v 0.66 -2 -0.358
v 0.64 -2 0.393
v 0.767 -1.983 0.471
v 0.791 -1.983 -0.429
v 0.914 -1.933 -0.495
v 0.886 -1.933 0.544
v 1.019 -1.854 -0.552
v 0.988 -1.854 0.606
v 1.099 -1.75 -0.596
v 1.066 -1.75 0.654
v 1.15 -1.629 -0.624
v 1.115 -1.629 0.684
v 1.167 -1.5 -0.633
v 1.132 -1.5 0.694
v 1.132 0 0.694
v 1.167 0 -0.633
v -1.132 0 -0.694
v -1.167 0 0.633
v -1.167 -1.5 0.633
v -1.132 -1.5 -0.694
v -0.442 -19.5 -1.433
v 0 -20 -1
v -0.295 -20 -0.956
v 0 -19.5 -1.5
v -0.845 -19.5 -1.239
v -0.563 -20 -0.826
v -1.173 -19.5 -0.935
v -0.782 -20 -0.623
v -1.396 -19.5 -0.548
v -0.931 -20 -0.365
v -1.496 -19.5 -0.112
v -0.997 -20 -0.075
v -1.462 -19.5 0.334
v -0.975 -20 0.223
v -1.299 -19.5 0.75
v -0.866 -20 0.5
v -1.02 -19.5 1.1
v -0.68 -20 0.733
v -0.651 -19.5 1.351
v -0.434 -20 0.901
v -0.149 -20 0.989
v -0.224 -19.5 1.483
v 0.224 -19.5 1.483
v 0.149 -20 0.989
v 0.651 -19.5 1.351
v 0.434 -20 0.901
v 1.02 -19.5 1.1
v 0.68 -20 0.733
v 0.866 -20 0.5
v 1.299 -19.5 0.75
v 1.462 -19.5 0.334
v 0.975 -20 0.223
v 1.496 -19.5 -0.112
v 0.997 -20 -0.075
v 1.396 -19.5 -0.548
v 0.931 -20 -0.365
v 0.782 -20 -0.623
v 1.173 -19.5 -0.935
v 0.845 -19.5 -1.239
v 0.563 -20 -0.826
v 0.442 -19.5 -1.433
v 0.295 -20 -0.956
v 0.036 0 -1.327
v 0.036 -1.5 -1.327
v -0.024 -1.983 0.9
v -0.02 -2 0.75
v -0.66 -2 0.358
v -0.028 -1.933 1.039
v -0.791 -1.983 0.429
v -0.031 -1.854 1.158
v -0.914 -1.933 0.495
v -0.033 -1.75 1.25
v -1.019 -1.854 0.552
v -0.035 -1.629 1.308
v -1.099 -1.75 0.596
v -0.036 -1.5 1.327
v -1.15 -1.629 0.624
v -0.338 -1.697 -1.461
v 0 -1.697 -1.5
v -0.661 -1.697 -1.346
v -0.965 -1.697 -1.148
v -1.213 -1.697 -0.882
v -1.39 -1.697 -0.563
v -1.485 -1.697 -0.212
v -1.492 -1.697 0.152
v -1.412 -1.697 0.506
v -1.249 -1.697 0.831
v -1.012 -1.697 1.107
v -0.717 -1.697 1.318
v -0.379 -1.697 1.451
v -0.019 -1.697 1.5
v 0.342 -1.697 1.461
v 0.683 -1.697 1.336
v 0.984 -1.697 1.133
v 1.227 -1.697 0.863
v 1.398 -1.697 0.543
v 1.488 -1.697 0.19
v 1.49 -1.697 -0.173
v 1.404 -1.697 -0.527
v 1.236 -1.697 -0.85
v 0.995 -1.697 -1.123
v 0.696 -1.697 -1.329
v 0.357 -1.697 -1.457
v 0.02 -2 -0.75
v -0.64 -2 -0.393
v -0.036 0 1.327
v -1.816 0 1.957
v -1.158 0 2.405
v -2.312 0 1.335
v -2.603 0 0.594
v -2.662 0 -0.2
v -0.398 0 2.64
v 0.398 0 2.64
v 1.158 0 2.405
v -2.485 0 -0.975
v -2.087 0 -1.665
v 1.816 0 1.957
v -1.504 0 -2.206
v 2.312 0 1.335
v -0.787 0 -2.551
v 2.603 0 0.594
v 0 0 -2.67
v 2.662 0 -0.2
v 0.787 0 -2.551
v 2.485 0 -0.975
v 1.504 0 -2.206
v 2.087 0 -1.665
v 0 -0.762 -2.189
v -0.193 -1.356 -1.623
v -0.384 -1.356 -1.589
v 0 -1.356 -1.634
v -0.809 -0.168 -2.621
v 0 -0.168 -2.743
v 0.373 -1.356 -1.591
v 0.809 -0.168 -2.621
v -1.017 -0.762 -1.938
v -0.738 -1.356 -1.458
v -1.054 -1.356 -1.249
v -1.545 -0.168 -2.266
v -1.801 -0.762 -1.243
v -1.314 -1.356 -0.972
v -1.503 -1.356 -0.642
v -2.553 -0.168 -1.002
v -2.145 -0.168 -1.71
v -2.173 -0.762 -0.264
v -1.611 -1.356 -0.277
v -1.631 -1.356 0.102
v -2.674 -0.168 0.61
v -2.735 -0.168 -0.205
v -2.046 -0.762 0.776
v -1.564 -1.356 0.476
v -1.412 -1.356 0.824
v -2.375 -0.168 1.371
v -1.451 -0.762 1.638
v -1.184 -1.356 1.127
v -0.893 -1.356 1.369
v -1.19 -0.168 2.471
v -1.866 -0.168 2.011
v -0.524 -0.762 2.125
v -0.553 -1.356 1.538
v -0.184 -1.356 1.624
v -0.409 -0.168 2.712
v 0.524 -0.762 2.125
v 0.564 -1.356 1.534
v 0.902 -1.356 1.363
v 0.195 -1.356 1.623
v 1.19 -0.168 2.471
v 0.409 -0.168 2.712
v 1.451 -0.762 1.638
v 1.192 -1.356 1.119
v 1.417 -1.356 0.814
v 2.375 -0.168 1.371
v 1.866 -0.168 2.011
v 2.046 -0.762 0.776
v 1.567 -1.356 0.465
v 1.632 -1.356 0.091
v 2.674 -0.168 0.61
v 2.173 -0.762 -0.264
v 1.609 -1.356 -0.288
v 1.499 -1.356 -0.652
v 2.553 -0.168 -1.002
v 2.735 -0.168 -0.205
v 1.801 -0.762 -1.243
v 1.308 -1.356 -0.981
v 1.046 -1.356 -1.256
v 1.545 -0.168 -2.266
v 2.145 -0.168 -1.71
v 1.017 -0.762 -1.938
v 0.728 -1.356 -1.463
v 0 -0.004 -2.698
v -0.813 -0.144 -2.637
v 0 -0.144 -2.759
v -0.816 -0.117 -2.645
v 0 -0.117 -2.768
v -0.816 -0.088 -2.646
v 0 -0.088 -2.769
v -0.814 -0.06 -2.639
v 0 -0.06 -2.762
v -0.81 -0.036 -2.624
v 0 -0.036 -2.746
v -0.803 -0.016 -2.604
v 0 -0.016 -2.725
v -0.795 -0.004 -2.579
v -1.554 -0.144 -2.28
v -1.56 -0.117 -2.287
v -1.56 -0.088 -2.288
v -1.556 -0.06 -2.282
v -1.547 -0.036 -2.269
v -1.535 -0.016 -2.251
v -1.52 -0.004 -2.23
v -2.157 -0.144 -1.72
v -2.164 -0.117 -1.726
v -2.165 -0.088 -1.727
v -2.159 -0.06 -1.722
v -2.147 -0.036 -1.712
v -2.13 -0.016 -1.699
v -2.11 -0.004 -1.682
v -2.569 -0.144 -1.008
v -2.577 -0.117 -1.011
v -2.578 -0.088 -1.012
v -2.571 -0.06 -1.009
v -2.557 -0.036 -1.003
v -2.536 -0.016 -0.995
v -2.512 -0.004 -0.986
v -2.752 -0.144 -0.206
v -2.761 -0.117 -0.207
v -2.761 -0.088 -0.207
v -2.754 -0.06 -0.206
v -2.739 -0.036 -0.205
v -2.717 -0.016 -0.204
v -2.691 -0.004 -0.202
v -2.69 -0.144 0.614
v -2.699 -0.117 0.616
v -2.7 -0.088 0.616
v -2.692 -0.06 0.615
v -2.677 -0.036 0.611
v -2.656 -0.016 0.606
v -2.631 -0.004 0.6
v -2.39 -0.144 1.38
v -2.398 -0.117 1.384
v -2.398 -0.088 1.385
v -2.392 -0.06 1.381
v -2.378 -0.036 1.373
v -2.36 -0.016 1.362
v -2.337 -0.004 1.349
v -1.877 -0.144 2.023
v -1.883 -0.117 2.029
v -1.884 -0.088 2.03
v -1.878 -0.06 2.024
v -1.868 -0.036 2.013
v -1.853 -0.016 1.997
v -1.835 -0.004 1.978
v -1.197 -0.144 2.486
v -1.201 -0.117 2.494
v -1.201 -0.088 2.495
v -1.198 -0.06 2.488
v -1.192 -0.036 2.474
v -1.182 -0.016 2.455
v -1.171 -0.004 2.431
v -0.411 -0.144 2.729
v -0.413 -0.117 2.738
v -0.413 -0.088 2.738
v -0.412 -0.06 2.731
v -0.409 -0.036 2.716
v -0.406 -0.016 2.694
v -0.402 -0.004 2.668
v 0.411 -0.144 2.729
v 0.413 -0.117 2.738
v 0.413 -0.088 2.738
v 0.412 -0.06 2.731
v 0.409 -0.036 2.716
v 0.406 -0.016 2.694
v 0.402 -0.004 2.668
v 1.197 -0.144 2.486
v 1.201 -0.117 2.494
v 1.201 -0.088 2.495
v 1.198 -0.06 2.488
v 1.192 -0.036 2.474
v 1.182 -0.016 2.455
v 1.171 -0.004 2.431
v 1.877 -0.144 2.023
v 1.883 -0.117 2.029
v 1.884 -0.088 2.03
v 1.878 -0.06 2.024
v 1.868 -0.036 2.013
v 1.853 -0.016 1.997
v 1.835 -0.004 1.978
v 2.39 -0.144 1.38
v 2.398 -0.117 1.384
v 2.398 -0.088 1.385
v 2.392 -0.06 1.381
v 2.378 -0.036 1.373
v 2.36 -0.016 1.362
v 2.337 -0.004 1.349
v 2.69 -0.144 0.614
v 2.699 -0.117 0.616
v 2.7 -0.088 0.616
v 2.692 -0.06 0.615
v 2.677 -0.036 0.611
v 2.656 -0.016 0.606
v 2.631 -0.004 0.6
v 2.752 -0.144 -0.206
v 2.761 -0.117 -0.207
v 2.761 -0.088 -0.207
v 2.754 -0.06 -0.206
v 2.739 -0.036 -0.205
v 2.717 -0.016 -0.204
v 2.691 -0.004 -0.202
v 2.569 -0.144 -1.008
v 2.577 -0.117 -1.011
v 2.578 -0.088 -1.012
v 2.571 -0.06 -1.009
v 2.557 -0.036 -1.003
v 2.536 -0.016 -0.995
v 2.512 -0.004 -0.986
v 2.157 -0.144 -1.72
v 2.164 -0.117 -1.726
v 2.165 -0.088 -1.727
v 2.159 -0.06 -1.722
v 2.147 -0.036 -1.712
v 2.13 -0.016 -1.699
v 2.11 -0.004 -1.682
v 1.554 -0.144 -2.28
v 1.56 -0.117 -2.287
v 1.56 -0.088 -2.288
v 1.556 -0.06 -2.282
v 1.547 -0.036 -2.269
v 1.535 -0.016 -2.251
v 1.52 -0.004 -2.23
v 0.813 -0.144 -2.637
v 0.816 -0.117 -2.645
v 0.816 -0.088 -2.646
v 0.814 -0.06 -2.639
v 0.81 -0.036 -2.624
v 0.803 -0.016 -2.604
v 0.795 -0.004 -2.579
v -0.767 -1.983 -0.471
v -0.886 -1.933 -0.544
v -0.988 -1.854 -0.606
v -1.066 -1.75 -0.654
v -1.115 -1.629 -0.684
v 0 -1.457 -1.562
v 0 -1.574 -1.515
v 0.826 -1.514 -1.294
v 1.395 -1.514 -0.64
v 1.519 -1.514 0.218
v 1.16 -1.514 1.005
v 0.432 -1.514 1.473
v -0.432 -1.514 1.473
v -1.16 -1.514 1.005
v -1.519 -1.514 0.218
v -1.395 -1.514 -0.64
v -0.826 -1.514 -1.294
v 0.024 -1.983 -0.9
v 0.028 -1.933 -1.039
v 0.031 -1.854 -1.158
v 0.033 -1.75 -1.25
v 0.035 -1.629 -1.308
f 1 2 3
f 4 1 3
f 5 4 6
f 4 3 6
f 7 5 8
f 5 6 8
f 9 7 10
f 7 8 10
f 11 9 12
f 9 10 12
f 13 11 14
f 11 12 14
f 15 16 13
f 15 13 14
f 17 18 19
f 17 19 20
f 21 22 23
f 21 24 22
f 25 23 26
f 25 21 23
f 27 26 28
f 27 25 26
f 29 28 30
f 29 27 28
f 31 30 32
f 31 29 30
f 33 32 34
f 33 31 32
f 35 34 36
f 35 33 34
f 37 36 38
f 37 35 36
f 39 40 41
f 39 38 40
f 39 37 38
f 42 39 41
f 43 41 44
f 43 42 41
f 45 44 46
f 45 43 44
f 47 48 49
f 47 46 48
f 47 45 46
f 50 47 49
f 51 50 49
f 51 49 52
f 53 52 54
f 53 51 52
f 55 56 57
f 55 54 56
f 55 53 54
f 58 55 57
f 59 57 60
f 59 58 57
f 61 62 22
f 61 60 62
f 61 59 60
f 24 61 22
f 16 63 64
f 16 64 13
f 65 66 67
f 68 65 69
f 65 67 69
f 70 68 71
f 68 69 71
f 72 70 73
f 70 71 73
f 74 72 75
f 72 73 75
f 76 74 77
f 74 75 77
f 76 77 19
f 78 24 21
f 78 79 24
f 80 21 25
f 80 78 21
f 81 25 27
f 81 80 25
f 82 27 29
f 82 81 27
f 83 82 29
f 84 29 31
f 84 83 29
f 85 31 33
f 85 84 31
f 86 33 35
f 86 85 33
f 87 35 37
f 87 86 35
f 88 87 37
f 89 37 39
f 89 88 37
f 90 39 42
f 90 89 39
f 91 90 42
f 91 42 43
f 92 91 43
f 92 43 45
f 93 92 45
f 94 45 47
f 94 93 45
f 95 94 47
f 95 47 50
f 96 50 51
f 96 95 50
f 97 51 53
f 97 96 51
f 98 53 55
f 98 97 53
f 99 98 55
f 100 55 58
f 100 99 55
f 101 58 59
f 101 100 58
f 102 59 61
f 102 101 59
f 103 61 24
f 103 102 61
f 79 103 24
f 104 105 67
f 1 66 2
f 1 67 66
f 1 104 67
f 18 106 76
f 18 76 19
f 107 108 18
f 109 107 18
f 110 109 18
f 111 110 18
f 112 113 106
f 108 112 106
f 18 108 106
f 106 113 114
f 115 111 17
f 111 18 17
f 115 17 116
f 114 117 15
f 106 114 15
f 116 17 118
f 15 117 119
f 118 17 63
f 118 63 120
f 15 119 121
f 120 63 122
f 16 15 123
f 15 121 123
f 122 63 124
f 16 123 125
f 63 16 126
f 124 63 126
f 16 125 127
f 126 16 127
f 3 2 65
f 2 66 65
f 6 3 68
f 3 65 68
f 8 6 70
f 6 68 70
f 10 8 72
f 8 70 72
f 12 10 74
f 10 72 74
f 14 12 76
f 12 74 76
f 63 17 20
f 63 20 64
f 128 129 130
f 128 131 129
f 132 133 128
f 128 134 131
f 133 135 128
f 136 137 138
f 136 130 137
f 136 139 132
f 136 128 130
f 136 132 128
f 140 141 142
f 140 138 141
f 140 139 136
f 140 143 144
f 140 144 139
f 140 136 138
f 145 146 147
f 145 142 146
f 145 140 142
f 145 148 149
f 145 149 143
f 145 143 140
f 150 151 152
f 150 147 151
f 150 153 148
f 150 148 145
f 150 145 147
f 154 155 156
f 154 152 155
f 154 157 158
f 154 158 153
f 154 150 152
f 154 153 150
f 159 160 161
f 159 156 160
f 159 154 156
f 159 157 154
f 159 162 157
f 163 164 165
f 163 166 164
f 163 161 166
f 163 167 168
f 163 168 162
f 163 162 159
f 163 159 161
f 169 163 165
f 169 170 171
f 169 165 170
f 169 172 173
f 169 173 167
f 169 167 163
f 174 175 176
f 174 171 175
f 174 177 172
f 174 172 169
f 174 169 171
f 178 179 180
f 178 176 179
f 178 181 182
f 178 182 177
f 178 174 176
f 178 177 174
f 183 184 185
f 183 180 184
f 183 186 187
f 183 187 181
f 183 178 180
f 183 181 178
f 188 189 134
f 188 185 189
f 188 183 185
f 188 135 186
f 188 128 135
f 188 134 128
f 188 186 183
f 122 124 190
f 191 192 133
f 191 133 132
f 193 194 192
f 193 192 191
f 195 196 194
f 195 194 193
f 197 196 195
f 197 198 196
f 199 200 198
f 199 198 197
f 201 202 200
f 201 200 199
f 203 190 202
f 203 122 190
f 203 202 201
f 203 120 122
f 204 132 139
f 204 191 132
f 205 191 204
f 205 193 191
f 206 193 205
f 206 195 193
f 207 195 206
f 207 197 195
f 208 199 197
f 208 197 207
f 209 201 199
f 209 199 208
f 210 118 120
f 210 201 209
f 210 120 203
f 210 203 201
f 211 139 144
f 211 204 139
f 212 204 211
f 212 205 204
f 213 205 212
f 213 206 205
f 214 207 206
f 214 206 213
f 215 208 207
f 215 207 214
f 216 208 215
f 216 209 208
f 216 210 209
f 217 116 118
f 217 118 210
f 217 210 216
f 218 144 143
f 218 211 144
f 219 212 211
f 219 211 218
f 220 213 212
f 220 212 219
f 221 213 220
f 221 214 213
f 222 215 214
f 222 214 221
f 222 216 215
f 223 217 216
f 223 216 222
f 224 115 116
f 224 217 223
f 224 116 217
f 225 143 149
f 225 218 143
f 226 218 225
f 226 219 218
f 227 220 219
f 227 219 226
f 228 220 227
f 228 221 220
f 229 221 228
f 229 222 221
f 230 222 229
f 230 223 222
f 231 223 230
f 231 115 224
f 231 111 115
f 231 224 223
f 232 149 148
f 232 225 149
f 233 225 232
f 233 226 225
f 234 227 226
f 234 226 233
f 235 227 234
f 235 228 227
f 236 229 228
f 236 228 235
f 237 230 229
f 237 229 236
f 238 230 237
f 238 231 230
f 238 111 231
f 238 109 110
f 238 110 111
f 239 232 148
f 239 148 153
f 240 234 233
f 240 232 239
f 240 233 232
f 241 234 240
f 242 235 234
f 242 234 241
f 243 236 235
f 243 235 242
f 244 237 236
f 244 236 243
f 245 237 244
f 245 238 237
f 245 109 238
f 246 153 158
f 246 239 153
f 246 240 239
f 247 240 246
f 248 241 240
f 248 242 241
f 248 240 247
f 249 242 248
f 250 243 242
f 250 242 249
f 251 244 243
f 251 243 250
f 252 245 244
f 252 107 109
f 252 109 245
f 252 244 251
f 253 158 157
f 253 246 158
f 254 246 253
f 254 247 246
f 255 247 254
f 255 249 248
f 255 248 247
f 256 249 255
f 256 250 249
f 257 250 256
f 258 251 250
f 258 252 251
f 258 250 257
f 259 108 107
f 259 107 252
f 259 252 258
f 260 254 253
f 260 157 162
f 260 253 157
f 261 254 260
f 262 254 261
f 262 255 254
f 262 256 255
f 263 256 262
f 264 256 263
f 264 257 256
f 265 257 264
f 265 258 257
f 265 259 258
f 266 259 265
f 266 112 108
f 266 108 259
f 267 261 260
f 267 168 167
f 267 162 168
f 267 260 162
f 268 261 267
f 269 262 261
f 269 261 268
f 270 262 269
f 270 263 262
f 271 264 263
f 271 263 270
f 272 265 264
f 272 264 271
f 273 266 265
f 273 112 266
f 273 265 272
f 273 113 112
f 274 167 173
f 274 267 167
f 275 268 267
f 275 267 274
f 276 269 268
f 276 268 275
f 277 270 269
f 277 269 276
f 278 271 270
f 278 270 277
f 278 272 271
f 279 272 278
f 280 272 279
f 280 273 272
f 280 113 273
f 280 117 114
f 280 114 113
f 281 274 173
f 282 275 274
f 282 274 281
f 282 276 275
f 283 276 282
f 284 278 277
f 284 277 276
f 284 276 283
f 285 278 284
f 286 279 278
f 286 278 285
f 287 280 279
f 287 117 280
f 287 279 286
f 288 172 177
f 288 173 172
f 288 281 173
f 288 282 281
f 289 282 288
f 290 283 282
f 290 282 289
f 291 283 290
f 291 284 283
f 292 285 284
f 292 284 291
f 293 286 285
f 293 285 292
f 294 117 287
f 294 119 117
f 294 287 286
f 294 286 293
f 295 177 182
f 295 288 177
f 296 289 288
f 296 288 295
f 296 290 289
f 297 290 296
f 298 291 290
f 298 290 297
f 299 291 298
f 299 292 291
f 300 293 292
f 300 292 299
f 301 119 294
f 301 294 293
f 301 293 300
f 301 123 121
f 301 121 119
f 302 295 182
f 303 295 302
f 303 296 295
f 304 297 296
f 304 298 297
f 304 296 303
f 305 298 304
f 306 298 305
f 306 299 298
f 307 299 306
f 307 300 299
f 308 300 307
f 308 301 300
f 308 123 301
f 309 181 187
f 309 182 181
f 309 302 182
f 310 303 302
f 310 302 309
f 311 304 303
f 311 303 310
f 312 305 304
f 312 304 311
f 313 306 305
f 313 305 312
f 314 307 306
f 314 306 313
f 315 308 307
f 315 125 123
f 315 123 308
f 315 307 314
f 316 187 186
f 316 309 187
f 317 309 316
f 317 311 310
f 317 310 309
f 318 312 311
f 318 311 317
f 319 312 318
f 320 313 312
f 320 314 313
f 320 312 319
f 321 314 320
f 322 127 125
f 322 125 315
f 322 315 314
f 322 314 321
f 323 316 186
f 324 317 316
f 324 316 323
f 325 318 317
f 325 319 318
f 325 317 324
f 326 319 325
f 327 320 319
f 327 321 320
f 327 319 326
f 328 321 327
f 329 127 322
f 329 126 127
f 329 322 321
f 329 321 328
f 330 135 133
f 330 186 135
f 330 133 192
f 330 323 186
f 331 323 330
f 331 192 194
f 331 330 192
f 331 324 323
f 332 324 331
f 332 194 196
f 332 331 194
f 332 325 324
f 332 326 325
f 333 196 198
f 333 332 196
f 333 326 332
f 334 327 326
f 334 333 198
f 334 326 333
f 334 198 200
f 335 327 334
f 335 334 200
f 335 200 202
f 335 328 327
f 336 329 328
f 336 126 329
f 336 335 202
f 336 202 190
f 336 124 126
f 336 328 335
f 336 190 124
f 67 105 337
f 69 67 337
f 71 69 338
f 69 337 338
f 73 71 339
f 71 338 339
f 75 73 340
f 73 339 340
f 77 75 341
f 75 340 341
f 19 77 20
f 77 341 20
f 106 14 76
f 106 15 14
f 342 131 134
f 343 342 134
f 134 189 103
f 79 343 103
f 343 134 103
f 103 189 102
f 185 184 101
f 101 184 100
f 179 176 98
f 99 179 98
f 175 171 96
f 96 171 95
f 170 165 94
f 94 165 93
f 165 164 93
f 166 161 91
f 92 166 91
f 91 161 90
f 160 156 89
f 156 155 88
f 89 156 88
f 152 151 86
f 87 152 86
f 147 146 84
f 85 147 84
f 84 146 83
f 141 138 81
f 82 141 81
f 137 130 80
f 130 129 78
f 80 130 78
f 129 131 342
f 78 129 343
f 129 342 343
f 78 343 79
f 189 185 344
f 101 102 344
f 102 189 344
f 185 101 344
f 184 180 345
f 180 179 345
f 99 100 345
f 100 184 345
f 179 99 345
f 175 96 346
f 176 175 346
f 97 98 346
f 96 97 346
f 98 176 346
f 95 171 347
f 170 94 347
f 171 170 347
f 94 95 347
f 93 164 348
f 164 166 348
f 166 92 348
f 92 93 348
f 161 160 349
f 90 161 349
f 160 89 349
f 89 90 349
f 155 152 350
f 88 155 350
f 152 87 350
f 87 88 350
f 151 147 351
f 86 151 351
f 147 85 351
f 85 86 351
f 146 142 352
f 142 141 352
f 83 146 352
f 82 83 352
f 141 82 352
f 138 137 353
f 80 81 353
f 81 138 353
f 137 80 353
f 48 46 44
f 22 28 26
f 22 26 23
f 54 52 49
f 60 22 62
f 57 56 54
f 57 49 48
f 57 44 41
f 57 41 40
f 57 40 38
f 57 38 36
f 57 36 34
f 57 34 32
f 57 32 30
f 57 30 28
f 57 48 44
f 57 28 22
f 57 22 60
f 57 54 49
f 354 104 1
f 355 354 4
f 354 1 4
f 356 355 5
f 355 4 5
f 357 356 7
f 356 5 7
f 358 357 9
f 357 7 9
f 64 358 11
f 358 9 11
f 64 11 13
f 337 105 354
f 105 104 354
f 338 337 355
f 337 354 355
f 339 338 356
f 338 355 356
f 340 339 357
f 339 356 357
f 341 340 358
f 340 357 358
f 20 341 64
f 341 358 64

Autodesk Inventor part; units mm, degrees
ref_plane "YZ Plane" through (0, 0, 0) normal (1, 0, 0) x (0, 1, 0)
ref_plane "XZ Plane" through (0, 0, 0) normal (0, 1, 0) x (-1, 0, 0)
ref_plane "XY Plane" through (0, 0, 0) normal (0, 0, 1) x (1, 0, 0)
sketch "Szkic2" plane through (0, 0, 0) normal (1, 0, 0) x (0, 1, 0)
  line L0 (0, -2.9) -> (0, 2.9)
  line L1 (-1.5, -1.5) -> (-1.5, 1.5)
  line L2 (-1.5, -1.5) -> (0, -2.9)
  line L3 (-1.5, 1.5) -> (0, 2.9)
  line L4 (0, 0) -> (-20, 0)
  line L5 (-20, 0) -> (-20, -1.5)
  line L6 (-20, -1.5) -> (-1.5, -1.5)
  dimension "d0" = 5.8
  dimension "d2" = 3
  dimension "d3" = 1.5
  dimension "d4" = 20
  dimension "d5" = 1.5
revolve "Obrót1" add sketch "Szkic2" angle 360 about axis through (0, 0, 0) along (0, -1, 0) contours L2 L1 L4 L0 | L6 L5 L4 L1
sketch "Szkic3" plane through (0, 0, 0) normal (0, 1, 0) x (1, 0, 0)
  line L0 (-1.1673, -0.633) -> (-1.1318, 0.6945)
  line L1 (-1.1318, 0.6945) -> (0.0355, 1.3274)
  line L2 (0.0355, 1.3274) -> (1.1673, 0.633)
  line L3 (1.1673, 0.633) -> (1.1318, -0.6945)
  line L4 (1.1318, -0.6945) -> (-0.0355, -1.3274)
  line L5 (-0.0355, -1.3274) -> (-1.1673, -0.633)
  point P0 (0, 0)
  point P1 (0, 0)
  dimension "d7" = 2.3
extrude "Wyciągnięcie proste1" cut sketch "Szkic3" against normal blind 2
fillet "Zaokrąglenie1" radius 0.5 6 edges at (-1.1496, -2, -0.0308) (-0.6014, -2, 0.9802) (-0.5482, -2, -1.011) (0.6014, -2, -0.9802) (0.5482, -2, 1.011) (1.1496, -2, 0.0308)
fillet "Zaokrąglenie2" radius 0.5 1 edges at (0, -1.5, 1.5)
fillet "Zaokrąglenie3" radius 0.1 1 edges at (0, 0, 2.9)
thread "Gwint1" size "M3x0.5" class "6g" standard "ANSI Metric M Profile" full length
chamfer "Faza1" distance 0.5 angle 45 1 edges at (0, -20, 1.5)
properties part number "Screw M3 20mm flat head"
